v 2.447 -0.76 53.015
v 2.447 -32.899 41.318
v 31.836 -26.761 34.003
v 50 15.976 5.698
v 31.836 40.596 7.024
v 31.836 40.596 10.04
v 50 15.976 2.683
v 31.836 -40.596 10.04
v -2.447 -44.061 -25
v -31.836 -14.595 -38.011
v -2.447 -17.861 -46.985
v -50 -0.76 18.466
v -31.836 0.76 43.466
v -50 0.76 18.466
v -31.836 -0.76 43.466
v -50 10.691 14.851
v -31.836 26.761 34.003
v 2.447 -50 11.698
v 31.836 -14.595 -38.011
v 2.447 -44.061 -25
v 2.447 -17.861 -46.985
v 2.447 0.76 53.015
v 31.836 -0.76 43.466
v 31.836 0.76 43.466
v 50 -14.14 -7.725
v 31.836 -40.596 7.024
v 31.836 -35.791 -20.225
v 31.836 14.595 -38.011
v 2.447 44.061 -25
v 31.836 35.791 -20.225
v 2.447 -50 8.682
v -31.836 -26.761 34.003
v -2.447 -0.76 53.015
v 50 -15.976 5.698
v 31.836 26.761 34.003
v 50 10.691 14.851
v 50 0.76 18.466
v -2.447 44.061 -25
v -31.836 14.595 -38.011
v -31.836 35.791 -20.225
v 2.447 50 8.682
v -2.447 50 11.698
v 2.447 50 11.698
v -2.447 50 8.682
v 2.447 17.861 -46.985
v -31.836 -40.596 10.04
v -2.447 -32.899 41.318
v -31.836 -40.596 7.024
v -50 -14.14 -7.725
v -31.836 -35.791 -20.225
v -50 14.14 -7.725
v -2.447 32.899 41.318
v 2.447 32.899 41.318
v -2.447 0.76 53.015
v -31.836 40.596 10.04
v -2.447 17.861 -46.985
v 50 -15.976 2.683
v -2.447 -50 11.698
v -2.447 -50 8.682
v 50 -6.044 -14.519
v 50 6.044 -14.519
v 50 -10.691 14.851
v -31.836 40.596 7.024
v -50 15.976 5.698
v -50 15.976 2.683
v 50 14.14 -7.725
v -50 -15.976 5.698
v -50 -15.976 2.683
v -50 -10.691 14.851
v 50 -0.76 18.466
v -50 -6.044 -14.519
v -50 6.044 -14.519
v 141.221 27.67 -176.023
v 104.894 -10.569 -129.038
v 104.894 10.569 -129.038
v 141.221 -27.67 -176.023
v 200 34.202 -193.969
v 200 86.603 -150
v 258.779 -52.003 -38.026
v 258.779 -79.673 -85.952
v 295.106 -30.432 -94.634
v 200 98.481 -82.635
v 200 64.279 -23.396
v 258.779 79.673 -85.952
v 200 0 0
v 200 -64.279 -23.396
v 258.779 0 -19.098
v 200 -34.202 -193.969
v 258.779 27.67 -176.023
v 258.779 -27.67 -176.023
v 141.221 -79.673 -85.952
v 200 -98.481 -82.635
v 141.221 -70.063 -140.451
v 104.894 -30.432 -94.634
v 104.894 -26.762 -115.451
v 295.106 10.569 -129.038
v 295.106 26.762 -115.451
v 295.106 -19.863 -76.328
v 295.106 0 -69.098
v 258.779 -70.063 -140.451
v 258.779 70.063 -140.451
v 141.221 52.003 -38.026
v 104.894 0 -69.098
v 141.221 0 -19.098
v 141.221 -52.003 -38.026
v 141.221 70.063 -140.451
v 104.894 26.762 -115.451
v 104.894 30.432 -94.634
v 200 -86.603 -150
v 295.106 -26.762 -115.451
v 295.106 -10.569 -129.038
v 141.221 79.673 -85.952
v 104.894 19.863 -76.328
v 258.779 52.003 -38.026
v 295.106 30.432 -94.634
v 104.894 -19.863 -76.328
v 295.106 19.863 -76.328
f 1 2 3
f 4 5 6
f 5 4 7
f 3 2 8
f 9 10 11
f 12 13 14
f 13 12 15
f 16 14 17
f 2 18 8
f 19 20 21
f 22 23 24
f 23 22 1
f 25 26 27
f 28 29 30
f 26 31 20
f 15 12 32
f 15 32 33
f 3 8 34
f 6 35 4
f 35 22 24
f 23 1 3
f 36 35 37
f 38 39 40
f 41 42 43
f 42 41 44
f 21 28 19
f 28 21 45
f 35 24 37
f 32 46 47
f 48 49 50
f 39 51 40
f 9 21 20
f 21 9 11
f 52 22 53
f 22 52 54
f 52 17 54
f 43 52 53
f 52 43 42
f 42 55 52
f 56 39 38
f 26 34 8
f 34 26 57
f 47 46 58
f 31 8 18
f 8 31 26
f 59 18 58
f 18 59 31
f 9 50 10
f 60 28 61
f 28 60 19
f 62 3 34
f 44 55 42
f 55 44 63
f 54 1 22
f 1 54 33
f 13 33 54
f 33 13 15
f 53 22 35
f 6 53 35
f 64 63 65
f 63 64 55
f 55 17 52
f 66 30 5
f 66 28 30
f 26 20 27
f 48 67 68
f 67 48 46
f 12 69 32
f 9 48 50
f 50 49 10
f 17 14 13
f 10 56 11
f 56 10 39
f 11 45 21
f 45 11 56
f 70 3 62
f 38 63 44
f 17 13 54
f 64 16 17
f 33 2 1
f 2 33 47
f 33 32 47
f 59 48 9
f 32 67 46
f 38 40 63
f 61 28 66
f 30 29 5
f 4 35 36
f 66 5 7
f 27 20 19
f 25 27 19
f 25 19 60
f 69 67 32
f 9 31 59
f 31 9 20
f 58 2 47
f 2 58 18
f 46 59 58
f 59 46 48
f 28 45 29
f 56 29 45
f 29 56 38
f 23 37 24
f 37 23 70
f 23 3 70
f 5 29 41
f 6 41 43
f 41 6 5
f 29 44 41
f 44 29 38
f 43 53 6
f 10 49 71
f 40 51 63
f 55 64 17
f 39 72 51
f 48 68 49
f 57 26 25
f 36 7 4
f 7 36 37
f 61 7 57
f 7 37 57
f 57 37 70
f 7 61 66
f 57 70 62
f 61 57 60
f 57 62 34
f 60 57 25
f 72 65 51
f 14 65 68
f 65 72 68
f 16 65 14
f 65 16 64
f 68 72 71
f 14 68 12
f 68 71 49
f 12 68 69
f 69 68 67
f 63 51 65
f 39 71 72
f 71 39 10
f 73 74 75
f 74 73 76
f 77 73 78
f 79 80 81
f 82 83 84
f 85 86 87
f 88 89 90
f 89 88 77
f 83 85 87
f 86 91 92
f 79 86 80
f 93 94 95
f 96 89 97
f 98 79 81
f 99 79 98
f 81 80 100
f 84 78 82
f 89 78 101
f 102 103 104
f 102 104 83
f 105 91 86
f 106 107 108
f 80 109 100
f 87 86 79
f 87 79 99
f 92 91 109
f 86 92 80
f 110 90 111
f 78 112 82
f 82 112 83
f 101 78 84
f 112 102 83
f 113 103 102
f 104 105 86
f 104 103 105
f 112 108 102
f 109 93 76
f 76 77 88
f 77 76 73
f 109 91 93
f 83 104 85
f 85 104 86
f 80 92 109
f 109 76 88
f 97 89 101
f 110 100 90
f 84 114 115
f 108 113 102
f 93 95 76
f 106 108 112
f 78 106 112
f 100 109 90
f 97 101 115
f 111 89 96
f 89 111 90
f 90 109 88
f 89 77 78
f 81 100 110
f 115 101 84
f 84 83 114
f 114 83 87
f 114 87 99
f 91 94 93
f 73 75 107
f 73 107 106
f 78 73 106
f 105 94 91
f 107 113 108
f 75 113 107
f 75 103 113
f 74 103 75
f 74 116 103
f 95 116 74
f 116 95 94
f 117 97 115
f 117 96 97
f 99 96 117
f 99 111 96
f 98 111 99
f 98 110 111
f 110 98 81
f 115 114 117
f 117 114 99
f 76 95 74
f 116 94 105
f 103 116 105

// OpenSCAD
// file: ../chamferer.scad
INFINITY = 10000;
ATOM = .01;

module chamfer_tool(r, fn, tool,
                    ax, ay, az,
                    ax2, ay2, az2,
                    ax3, ay3, az3) {
    rotate([ax3, ay3, az3])
    rotate([ax2, ay2, az2])
    rotate([ax, ay, az]) {
        if (tool=="sphere") {
            sphere(r, $fn=fn);
        }
        else if (tool=="hemisphere-up") {
            intersection() {
                sphere(r, $fn=fn);
                cylinder(r=r*2, h=r*2);
            }
        }
        else if (tool=="hemisphere-down") {
            difference() {
                sphere(r, $fn=fn);
                cylinder(r=r*2, h=r*2);
            }
        }
        else if (tool=="cone") {
            cylinder(r, r, 0, $fn=fn);
            scale([1, 1, -1])
            cylinder(r, r, 0, $fn=fn);
        }
        else if (tool=="cone-up") {
            cylinder(r, r, 0, $fn=fn, center=true);
        }
        else if (tool=="cone-down") {
            scale([1, 1, -1])
            cylinder(r, r, 0, $fn=fn, center=true);
        }
        else if (tool=="octahedron") {
            resize([r*2, r*2, r*2]) {
                cylinder(r, r, 0, $fn=4);
                scale([1, 1, -1])
                cylinder(r, r, 0, $fn=4);
            }
        }
        else if (tool=="pyramid") {
            resize([r*2, r*2, r*2]) {
                cylinder(r, r, 0, center=true, $fn=4);
            }
        }
        else if (tool=="rpyramid") {
            resize([r*2, r*2, r*2]) {
                cylinder(r, 0, r, center=true, $fn=4);
            }
        }
        else if (tool=="cylinder-z" || tool=="cylinder") {
            cylinder(r=r, h=ATOM, $fn=fn, center=true);
        }
        else if (tool=="cylinder-x") {
            rotate([0, 90, 0])
            cylinder(r=r, h=ATOM, $fn=fn, center=true);
        }
        else if (tool=="cylinder-y") {
            rotate([90, 0, 0])
            cylinder(r=r, h=ATOM, $fn=fn, center=true);
        }
        else if (tool=="cube") {
            cube(r*2, center=true);
        }
        else if (tool=="plate-y") {
            cube([r*2, ATOM, r*2], center=true);
        }
        else {
            assert(false, str("Unknown tool: ", tool));
        }
    }
}

module shrinker(r, tool, fn,
                ax, ay, az,
                ax2, ay2, az2,
                ax3, ay3, az3) {
    if (!r) {
        children();
    }
    else {
        // re-invert+grow = fillet
        difference() {
            cube(INFINITY/2, center=true);

            // invert+grow = carve
            minkowski() {
                difference() {
                    cube(INFINITY, center=true);
                    children();
                }
                //cube(r, center=true);
                chamfer_tool(r, fn, tool,
                             ax, ay, az,
                             ax2, ay2, az2,
                             ax3, ay3, az3);
            }
        }
    }
}

module chamferer(r, tool="sphere", fn=8, shrink=true, grow=true,
                 ax=0, ay=0, az=0,
                 ax2=0, ay2=0, az2=0,
                 ax3=0, ay3=0, az3=0,
) {
    if (!r) {
        children();
    }
    else {
        minkowski() {
            if (shrink)
                shrinker(r, tool, fn,
                         ax, ay, az,
                         ax2, ay2, az2,
                         ax3, ay3, az3) children();
            else
                children();
            
            if (grow)
                chamfer_tool(r, fn, tool,
                             ax, ay, az,
                             ax2, ay2, az2,
                             ax3, ay3, az3);
        }
    }
}



cube(50);

translate([70, 0, 0])
chamferer(5, "hemisphere-up", $preview? 6*4 : 30)
//shrinker(5, "sphere", $preview? 6*4 : 30)
cube(50);

translate([70*2, 0, 0])
chamferer(5, "octahedron", grow=false)
cube(50);
// main file
use <../chamferer.scad>

chamferer(50, fn=9, ay=90, ax2=180)
cube(100, center=true);

translate([200, 0, -100])
//rotate([45, 35.2643, 0])
rotate([180, 0, 0])
rotate([0, 90, 0])
sphere(100, $fn=9);
//rotate([0, -90, 0])
//sphere(100, $fn=5);
